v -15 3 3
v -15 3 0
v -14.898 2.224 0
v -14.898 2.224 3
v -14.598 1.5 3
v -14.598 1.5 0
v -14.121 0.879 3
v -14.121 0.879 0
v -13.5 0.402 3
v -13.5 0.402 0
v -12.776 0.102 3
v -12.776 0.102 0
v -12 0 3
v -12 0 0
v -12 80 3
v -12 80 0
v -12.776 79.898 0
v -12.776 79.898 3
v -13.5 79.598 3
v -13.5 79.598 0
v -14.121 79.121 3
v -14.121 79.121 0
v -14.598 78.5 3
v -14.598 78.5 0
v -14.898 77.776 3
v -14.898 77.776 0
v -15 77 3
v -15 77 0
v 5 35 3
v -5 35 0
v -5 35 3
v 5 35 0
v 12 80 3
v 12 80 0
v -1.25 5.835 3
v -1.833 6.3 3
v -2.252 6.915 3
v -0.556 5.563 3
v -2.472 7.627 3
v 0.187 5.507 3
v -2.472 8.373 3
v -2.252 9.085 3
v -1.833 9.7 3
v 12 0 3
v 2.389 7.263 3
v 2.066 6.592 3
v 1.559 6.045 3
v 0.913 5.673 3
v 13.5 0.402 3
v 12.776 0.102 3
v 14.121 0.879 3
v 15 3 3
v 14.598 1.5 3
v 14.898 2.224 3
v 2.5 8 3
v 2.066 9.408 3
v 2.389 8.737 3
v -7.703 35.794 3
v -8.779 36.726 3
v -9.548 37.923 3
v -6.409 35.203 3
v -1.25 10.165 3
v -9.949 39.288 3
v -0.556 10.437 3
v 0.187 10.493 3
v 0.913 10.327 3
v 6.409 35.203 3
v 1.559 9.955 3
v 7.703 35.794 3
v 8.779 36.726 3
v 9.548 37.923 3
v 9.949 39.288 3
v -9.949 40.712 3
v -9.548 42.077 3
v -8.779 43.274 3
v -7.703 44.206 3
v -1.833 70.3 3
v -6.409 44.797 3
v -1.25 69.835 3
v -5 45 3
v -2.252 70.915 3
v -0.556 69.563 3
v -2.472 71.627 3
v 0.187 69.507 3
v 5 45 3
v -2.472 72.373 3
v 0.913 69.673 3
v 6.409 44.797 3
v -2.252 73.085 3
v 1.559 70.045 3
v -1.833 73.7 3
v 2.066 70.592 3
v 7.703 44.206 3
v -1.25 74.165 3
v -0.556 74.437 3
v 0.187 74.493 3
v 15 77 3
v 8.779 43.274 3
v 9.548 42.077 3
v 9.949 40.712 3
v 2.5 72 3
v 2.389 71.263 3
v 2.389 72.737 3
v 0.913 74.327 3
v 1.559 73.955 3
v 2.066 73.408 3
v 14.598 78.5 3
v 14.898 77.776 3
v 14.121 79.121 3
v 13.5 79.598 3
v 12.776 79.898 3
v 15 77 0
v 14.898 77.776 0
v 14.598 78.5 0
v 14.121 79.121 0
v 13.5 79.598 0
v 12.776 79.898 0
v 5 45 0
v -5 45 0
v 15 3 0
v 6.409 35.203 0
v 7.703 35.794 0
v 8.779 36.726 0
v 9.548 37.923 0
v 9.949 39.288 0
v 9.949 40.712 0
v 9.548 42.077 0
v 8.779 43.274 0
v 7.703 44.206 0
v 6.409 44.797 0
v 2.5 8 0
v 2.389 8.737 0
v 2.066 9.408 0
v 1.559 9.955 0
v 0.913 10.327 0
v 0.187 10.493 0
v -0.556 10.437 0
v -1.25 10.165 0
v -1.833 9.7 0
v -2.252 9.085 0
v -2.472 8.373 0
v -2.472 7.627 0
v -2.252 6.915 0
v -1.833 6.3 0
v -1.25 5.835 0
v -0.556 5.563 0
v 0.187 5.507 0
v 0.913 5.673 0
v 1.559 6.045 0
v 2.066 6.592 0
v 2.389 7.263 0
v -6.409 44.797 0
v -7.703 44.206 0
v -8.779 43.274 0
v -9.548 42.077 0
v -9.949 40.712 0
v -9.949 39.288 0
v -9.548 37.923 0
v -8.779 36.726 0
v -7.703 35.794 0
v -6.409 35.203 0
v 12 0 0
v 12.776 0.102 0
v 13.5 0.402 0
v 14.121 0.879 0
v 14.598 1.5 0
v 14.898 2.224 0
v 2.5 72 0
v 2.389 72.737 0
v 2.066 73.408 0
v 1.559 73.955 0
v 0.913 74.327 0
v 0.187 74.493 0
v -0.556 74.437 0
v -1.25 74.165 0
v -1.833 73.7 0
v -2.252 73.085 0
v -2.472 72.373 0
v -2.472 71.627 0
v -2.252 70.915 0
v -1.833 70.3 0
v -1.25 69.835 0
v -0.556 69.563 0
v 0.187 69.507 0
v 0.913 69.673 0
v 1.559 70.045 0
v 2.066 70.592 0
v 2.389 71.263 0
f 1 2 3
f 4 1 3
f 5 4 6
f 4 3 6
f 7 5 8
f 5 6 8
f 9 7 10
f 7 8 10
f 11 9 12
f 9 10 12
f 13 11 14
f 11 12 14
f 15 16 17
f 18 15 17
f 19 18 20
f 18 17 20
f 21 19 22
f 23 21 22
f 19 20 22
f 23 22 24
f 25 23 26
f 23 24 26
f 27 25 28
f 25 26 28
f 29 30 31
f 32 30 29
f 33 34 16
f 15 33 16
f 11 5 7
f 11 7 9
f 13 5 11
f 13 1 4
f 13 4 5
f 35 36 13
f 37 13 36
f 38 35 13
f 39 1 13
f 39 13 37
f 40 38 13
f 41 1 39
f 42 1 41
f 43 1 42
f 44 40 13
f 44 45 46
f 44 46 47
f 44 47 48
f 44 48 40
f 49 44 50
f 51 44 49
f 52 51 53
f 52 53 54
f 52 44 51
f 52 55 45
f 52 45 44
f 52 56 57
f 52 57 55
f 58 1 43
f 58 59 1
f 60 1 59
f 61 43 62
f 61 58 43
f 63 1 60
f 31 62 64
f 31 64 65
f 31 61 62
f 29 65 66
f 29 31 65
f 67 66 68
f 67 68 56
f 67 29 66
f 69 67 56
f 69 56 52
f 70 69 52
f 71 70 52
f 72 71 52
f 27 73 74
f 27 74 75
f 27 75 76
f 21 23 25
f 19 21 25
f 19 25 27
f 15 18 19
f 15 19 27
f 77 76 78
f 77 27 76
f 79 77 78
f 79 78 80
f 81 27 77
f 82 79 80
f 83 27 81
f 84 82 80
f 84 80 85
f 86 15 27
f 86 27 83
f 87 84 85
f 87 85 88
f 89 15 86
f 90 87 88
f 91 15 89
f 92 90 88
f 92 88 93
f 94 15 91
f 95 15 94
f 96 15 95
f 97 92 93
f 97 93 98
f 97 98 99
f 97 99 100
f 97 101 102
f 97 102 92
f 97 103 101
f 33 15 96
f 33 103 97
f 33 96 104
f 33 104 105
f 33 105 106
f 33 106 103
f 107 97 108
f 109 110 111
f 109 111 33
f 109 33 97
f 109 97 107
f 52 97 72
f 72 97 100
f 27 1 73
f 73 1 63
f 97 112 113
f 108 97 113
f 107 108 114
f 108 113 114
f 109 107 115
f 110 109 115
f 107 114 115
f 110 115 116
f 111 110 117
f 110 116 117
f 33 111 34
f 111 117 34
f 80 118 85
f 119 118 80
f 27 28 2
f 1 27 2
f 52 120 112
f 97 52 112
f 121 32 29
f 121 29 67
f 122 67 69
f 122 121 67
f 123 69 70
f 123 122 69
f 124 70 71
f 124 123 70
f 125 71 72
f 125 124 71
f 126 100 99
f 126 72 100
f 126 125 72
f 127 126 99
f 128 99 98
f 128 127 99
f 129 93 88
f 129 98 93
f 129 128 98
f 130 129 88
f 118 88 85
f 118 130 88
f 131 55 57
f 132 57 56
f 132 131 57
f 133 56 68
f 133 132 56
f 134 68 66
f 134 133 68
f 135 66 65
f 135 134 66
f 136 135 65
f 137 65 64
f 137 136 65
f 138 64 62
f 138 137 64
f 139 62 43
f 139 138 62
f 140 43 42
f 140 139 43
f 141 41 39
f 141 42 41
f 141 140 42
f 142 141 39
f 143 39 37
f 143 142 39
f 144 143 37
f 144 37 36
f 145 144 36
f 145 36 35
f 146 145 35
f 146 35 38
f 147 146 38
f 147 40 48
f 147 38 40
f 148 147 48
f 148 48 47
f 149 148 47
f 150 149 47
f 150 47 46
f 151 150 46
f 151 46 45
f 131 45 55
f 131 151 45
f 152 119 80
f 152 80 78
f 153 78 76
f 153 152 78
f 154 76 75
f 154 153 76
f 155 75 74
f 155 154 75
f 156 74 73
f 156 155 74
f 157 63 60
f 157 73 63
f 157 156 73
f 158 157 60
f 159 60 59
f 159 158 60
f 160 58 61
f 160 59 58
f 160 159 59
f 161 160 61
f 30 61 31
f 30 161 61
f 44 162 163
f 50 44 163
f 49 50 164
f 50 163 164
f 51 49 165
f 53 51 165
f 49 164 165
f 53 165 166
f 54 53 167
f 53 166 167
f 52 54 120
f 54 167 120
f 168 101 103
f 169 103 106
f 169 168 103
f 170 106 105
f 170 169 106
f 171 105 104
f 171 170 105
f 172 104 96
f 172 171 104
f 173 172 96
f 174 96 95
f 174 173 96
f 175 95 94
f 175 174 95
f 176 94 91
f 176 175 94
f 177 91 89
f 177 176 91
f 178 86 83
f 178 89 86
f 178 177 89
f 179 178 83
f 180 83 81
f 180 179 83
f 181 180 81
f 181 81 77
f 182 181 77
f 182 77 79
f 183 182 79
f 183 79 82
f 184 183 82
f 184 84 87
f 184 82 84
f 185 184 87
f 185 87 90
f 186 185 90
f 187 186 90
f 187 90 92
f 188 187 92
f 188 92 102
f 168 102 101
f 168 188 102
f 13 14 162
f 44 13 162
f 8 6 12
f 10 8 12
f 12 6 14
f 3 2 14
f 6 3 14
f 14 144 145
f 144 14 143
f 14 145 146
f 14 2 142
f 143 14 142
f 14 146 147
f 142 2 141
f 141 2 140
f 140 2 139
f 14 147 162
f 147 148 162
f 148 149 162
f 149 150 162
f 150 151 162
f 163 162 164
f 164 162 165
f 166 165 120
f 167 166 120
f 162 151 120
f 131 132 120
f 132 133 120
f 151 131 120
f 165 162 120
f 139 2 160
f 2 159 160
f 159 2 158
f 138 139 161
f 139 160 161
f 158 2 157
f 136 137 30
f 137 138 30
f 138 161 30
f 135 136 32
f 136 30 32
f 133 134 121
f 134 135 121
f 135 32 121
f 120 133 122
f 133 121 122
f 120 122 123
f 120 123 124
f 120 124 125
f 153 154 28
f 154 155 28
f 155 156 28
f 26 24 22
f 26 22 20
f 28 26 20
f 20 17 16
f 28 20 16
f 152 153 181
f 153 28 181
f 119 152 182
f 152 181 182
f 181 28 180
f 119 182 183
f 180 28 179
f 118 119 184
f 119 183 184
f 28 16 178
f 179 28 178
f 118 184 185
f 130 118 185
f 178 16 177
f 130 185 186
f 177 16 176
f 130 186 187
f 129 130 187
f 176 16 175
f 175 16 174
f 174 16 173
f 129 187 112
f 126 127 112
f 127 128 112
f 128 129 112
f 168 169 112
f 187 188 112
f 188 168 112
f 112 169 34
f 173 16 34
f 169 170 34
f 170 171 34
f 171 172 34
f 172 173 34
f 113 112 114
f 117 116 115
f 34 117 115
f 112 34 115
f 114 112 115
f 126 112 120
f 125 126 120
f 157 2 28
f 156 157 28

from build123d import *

# Parameters (mm, degrees)
EXTRUDE_1_DEPTH     = 3
SKETCH_2_R          = 2.5
CUT_EXTRUDE_1_DEPTH = 82.449370777


with BuildPart() as part:
    # 草图1 → 凸台-拉伸1 (new body)
    with BuildSketch(Plane.XY):
        with BuildLine():
            Line((-12, 0), (12, 0))
            ThreePointArc((12, 0), (14.121320344, 0.878679656), (15, 3))
            Line((15, 3), (15, 77))
            ThreePointArc((15, 77), (14.121320344, 79.121320344), (12, 80))
            Line((12, 80), (-12, 80))
            ThreePointArc((-12, 80), (-14.121320344, 79.121320344), (-15, 77))
            Line((-15, 77), (-15, 3))
            ThreePointArc((-15, 3), (-14.121320344, 0.878679656), (-12, 0))
        make_face()
    extrude(amount=EXTRUDE_1_DEPTH)

    # 草图2 → 切除-拉伸1 (cut, through all)
    with BuildSketch(Plane.XY):
        with Locations((0, 8)):
            Circle(SKETCH_2_R)
        with Locations((0, 72)):
            Circle(SKETCH_2_R)
        with BuildLine():
            Line((-5, 35), (5, 35))
            ThreePointArc((5, 35), (10, 40), (5, 45))
            Line((5, 45), (-5, 45))
            ThreePointArc((-5, 45), (-10, 40), (-5, 35))
        make_face()
    extrude(amount=CUT_EXTRUDE_1_DEPTH, mode=Mode.SUBTRACT)


solid = part.part
